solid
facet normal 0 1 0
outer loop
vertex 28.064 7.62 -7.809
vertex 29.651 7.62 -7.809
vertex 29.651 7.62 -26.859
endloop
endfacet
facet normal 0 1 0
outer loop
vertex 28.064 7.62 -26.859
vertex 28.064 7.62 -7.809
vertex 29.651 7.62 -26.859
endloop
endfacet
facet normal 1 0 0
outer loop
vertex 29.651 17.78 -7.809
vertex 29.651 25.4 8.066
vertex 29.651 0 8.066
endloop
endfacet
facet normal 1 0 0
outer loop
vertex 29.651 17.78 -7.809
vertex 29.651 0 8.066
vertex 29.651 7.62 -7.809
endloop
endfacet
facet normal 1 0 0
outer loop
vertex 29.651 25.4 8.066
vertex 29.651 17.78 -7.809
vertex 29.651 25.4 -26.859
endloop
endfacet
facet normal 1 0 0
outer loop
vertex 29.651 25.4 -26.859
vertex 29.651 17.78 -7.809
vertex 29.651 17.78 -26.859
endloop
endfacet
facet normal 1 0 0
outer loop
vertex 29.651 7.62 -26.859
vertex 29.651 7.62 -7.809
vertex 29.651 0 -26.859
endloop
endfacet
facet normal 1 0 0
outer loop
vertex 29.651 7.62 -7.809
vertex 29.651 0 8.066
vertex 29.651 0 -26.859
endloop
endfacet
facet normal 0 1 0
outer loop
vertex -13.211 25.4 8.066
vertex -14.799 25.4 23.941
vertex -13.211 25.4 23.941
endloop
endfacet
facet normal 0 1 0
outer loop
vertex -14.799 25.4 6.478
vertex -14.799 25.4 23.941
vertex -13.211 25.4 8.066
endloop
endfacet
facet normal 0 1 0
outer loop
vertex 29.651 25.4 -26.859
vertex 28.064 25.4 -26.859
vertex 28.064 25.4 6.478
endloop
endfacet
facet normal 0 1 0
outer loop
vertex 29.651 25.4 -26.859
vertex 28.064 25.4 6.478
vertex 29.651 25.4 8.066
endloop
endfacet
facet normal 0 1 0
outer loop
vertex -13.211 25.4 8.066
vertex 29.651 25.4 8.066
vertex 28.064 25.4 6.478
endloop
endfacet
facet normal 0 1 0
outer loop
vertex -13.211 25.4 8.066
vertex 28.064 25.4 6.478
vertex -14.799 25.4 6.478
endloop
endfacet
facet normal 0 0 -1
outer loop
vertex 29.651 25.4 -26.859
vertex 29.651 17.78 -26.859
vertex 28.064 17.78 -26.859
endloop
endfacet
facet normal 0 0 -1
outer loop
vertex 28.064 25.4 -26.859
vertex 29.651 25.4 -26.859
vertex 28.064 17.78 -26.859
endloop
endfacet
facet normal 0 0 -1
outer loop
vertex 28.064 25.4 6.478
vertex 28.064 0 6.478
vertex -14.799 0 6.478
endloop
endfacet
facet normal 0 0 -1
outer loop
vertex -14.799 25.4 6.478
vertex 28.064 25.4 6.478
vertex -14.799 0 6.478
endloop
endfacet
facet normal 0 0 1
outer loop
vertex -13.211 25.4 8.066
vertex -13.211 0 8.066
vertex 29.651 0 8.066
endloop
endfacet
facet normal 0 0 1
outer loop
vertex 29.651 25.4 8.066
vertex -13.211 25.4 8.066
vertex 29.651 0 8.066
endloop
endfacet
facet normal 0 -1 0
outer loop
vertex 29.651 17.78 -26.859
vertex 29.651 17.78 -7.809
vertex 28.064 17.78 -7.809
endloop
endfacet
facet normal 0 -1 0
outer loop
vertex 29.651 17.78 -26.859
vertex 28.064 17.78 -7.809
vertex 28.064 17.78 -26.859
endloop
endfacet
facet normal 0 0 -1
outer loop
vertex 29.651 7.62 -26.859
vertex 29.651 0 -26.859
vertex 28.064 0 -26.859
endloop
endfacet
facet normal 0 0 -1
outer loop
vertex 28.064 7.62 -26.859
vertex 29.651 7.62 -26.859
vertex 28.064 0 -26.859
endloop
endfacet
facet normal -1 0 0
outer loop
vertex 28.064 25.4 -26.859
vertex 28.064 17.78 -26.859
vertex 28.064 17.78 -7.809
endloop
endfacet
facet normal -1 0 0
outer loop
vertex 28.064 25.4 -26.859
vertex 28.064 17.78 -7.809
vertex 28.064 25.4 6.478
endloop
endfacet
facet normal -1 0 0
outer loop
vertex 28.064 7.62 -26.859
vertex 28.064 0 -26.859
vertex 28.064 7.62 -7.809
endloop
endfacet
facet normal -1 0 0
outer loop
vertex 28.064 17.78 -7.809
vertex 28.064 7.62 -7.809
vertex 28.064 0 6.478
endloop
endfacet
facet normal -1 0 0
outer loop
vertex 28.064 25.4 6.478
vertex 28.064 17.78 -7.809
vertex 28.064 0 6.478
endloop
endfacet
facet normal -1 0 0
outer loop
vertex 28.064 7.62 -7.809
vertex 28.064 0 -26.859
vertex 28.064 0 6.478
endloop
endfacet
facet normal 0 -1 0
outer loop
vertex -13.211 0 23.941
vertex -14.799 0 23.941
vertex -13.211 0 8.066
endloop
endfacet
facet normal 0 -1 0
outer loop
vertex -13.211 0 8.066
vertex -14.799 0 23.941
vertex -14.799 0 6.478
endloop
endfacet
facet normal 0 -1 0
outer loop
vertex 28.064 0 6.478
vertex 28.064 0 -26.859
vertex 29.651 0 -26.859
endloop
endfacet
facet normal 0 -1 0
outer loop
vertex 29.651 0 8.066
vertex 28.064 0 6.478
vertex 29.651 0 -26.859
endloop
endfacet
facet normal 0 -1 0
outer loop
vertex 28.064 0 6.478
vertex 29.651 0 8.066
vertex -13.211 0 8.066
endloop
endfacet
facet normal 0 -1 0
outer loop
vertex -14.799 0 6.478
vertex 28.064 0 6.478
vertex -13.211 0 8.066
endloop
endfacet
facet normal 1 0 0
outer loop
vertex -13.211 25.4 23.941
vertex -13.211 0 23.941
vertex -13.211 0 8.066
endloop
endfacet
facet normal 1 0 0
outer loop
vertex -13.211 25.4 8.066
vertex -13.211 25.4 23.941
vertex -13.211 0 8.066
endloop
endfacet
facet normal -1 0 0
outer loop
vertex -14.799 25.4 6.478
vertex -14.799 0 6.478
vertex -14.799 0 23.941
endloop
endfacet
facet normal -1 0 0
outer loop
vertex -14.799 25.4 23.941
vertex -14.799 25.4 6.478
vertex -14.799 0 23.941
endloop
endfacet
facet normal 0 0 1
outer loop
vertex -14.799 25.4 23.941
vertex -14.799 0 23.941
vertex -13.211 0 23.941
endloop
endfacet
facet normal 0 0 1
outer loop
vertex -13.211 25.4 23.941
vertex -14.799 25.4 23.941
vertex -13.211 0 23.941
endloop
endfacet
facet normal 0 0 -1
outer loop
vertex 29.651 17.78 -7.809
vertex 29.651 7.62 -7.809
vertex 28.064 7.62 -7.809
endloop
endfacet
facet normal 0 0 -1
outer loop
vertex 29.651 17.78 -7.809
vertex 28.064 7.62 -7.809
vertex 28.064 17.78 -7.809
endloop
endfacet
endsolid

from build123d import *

# Parameters (mm, degrees)
SKETCH1_W           = 41.275
SKETCH1_H           = 1.5875
BOSS_EXTRUDE1_DEPTH = 25.4
SKETCH2_W           = 19.05
SKETCH2_H           = 10.16
CUT_EXTRUDE1_DEPTH  = 25.4


with BuildPart() as part:
    # Sketch1 → Boss-Extrude1 (new body)
    with BuildSketch(Plane(origin=(0, 0, 0), x_dir=(1, 0, 0), z_dir=(0, 1, 0))):
        Polygon((-13.211086677, -8.065885175), (-13.211086677, -6.478385175), (-14.798586677, -6.478385175), (-14.798586677, -23.940885175), (-13.211086677, -23.940885175), align=None)
        with Locations((7.426413323, -7.272135175)):
            Rectangle(SKETCH1_W, SKETCH1_H)
        Polygon((29.651413323, 26.859114825), (28.063913323, 26.859114825), (28.063913323, -6.478385175), (28.063913323, -8.065885175), (29.651413323, -8.065885175), align=None)
    extrude(amount=BOSS_EXTRUDE1_DEPTH)

    # Sketch2 → Cut-Extrude1 (cut)
    with BuildSketch(Plane(origin=(29.651413323, 0, 0), x_dir=(0, 0, -1), z_dir=(1, 0, 0))):
        with Locations((17.334114825, 12.7)):
            Rectangle(SKETCH2_W, SKETCH2_H)
    extrude(amount=-CUT_EXTRUDE1_DEPTH, mode=Mode.SUBTRACT)


solid = part.part
